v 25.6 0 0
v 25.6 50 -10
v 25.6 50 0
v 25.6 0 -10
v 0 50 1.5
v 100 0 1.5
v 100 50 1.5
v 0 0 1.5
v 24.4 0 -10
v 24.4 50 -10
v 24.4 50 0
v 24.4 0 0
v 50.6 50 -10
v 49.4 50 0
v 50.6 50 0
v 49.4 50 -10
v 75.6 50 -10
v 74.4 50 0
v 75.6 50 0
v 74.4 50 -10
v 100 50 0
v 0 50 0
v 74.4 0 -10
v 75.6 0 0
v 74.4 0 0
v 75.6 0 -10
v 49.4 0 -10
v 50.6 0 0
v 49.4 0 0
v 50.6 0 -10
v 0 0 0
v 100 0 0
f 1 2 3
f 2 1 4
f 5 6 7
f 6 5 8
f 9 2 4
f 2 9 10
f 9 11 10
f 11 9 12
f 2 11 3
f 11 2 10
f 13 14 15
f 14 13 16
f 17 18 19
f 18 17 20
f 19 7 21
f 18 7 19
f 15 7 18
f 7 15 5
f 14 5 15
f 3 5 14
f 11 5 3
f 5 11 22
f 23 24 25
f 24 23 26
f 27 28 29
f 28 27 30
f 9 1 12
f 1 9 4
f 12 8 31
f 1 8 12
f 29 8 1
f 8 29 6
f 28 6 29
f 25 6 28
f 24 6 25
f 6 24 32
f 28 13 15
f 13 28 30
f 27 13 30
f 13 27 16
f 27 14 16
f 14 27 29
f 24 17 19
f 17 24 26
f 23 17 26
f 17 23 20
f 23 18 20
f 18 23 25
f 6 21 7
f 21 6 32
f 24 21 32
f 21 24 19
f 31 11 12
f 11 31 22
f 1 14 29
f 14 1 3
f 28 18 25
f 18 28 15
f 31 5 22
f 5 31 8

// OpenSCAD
$fn = 32;

// ----------------------------------------------------------------------
// Ribbed panel: 1.5 mm panel
// ----------------------------------------------------------------------

// --- parameters (mm) ---
panel_l = 100;            // panel length, X
panel_w = 50;             // panel width, Y
panel_t = 1.5;            // panel thickness, Z
rib_t = 1.2;              // rib thickness
rib_h = 10;               // rib height below the panel
ribs = 3;                 // number of ribs

total_h = panel_t + rib_h;  // overall height

union() {
  cube([panel_l, panel_w, panel_t]);
  for (i = [1 : ribs])
    translate([i * panel_l / (ribs + 1) - rib_t / 2, 0, -rib_h])
      cube([rib_t, panel_w, rib_h + panel_t]);
}
